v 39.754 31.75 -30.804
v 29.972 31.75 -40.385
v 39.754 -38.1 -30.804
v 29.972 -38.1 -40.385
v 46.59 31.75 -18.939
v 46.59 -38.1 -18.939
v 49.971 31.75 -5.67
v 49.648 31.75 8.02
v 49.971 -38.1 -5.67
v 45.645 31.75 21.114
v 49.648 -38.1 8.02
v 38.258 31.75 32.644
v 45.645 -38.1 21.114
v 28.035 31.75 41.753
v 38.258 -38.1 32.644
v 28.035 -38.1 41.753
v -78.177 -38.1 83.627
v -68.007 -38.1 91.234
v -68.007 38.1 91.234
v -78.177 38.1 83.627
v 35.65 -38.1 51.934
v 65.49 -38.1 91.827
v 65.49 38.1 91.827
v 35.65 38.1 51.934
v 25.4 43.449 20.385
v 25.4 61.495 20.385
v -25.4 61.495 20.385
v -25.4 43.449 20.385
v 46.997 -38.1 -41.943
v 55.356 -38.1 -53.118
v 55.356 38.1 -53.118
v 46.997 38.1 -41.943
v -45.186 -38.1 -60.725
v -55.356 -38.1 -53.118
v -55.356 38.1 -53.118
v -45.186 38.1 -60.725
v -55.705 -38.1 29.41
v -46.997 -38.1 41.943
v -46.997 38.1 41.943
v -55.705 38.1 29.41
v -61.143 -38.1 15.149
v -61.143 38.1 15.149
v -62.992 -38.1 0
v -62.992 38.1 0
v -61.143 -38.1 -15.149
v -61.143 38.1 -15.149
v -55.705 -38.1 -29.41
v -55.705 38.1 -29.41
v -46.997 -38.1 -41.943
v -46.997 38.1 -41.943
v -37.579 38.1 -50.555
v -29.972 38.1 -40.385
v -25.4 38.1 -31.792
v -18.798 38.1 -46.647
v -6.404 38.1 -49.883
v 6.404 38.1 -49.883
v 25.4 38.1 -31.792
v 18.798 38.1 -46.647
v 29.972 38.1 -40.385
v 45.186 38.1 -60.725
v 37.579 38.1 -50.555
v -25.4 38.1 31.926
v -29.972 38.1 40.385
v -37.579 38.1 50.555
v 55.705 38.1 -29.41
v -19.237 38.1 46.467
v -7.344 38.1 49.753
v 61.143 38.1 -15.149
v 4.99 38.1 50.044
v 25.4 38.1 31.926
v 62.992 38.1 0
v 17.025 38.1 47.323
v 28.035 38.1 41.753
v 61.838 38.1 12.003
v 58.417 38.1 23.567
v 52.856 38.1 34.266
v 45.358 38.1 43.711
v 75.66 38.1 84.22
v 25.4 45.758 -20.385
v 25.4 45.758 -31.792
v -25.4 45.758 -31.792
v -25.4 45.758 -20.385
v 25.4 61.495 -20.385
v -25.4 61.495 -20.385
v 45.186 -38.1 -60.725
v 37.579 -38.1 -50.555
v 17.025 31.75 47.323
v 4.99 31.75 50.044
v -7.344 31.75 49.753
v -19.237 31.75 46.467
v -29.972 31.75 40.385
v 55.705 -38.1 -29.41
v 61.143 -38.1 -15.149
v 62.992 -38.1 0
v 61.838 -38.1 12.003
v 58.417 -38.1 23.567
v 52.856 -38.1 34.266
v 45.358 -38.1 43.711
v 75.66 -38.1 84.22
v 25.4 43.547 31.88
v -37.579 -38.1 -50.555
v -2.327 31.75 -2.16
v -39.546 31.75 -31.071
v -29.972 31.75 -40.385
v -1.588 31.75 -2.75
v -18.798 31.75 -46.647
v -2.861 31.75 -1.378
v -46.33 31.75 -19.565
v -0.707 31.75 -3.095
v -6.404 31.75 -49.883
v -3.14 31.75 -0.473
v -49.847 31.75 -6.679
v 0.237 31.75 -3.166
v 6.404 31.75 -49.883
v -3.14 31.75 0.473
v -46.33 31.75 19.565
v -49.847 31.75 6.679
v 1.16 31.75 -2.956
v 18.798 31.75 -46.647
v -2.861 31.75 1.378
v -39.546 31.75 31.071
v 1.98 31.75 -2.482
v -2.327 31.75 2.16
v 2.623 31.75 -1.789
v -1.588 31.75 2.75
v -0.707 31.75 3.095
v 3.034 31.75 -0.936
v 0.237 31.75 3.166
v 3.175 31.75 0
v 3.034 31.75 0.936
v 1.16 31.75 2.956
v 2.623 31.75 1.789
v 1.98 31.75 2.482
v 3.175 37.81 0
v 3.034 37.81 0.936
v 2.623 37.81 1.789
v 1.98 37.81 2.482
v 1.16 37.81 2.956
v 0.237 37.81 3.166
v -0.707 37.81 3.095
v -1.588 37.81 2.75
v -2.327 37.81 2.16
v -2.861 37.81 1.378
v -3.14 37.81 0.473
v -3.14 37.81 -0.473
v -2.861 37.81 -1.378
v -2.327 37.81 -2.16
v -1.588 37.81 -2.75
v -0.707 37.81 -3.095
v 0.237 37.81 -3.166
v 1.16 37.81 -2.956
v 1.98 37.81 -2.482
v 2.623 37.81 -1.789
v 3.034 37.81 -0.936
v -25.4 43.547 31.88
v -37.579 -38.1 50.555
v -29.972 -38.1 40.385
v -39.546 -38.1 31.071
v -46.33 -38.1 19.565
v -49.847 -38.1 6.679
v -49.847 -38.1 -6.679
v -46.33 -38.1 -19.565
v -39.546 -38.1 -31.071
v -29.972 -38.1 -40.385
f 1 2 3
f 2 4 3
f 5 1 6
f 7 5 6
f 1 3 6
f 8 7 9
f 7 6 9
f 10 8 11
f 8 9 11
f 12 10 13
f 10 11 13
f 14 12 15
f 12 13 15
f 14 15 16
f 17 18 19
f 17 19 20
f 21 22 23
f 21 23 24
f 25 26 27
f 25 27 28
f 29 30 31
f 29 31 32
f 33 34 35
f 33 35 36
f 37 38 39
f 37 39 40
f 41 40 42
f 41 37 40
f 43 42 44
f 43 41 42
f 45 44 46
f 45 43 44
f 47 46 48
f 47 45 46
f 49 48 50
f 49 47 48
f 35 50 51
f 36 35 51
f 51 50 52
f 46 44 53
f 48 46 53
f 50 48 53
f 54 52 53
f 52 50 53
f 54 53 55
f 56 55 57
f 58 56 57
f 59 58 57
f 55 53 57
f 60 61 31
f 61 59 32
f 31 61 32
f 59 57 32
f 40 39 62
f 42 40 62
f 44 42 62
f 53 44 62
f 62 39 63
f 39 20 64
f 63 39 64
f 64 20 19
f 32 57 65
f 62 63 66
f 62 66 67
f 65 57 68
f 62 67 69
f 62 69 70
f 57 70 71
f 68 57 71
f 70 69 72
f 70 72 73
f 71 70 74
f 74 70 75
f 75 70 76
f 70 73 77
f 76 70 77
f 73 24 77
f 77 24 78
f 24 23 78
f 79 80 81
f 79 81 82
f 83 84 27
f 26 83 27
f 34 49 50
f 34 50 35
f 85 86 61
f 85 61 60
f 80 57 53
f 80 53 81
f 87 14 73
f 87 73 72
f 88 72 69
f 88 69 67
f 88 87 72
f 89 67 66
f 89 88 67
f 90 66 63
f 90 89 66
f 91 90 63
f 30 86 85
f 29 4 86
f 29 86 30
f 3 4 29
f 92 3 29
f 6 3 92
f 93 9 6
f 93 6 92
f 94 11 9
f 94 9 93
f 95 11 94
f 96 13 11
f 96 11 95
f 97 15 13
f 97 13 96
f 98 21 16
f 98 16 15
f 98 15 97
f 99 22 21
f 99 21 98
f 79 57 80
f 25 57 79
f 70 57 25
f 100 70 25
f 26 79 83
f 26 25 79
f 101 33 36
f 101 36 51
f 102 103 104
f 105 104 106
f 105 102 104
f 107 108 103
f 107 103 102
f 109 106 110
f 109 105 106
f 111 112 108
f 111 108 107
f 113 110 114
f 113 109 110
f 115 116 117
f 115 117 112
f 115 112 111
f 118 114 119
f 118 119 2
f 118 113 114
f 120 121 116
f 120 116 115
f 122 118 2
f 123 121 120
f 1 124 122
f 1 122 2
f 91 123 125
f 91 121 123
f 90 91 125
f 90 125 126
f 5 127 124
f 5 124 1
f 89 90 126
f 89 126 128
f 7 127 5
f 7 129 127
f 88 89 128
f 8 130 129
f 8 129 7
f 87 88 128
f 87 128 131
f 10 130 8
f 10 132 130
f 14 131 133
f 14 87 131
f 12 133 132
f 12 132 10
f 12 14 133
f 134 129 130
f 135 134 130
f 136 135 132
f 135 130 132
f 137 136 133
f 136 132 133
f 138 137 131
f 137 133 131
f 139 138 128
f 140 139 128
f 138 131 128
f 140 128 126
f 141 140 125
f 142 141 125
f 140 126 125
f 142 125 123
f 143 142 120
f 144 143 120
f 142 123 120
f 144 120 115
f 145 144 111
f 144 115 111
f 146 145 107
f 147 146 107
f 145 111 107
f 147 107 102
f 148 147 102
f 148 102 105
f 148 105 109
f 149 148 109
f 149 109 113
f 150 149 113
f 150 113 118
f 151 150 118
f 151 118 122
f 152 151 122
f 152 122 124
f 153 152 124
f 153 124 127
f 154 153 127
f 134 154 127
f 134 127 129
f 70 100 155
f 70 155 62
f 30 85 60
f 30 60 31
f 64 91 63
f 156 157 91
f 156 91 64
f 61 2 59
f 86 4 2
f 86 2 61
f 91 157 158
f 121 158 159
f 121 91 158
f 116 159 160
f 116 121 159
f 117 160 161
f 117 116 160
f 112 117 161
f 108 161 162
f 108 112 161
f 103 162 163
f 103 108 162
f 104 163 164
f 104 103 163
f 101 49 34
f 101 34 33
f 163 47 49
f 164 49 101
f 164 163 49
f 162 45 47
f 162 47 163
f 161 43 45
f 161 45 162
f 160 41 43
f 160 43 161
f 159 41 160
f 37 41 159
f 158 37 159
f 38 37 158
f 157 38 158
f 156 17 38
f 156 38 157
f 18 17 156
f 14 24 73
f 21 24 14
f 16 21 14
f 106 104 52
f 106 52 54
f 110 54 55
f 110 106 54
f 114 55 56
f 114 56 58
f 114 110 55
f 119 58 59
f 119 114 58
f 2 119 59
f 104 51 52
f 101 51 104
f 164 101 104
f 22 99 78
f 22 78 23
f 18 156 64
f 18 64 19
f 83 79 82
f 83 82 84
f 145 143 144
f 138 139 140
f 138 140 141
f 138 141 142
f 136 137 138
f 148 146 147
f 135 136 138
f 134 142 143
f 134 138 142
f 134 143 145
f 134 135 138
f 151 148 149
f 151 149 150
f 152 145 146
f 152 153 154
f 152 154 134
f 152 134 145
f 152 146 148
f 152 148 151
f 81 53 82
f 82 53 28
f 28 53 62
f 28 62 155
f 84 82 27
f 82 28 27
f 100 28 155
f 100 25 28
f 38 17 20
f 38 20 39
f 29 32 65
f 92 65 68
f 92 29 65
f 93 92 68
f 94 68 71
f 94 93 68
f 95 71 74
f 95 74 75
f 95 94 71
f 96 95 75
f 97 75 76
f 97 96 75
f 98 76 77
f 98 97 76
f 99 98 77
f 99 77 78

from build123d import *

# Parameters (mm, degrees)
F1_DEPTH      = 38.1
F2_R          = 50.292
F3_DEPTH      = 38.1
F3_DEPTH_BACK = 31.75
F4_R          = 3.175
F5_DEPTH      = 38.101
F6_W          = 7.948064871
F6_H          = 11.407840997
F7_DEPTH      = 25.4


with BuildPart() as f1:
    # F0 (on Front) → F1 (new body, symmetric)
    with BuildSketch(Plane.XZ):
        with BuildLine():
            ThreePointArc((-39.1949844139, 31.5125127655), (-34.8668765946, 36.2434294809), (-29.972, 40.38520125))
            Line((-29.972, 40.38520125), (-37.5791103585, 50.55494564))
            ThreePointArc((-37.5791103585, 50.55494564), (-42.506880267, 46.4882479125), (-46.9973581988, 41.9432996596))
            Line((-46.9973581988, 41.9432996596), (-39.1949844139, 31.5125127655))
        make_face()
        with BuildLine():
            ThreePointArc((-46.9973581988, 41.9432996596), (-42.506880267, 46.4882479125), (-37.5791103585, 50.55494564))
            Line((-37.5791103585, 50.55494564), (-68.0073361401, 91.2336349005))
            Line((-68.0073361401, 91.2336349005), (-78.1770228702, 83.6265676724))
            Line((-78.1770228702, 83.6265676724), (-46.9973581988, 41.9432996596))
        make_face()
        with BuildLine():
            ThreePointArc((35.649530109, 51.9336409951), (40.7121086164, 48.067829949), (45.3583906555, 43.7105074455))
            Line((45.3583906555, 43.7105074455), (75.6600814431, 84.2200354233))
            Line((75.6600814431, 84.2200354233), (65.490394713, 91.8271026513))
            Line((65.490394713, 91.8271026513), (35.649530109, 51.9336409951))
        make_face()
        with BuildLine():
            Line((46.9973581988, -41.9432996596), (39.1949844139, -31.5125127655))
            ThreePointArc((39.1949844139, -31.5125127655), (34.8668765946, -36.2434294809), (29.972, -40.38520125))
            Line((29.972, -40.38520125), (37.5791103585, -50.55494564))
            ThreePointArc((37.5791103585, -50.55494564), (42.506880267, -46.4882479125), (46.9973581988, -41.9432996596))
        make_face()
        with BuildLine():
            Line((55.3558211861, -53.1175074821), (46.9973581988, -41.9432996596))
            ThreePointArc((46.9973581988, -41.9432996596), (42.506880267, -46.4882479125), (37.5791103585, -50.55494564))
            Line((37.5791103585, -50.55494564), (45.186134456, -60.7245747102))
            Line((45.186134456, -60.7245747102), (55.3558211861, -53.1175074821))
        make_face()
        with BuildLine():
            Line((-37.5791103585, -50.55494564), (-29.972, -40.38520125))
            ThreePointArc((-29.972, -40.38520125), (-34.8668765946, -36.2434294809), (-39.1949844139, -31.5125127655))
            Line((-39.1949844139, -31.5125127655), (-46.9973581988, -41.9432996596))
            ThreePointArc((-46.9973581988, -41.9432996596), (-42.506880267, -46.4882479125), (-37.5791103585, -50.55494564))
        make_face()
        with BuildLine():
            Line((-45.186134456, -60.7245747102), (-37.5791103585, -50.55494564))
            ThreePointArc((-37.5791103585, -50.55494564), (-42.506880267, -46.4882479125), (-46.9973581988, -41.9432996596))
            Line((-46.9973581988, -41.9432996596), (-55.3558211861, -53.1175074821))
            Line((-55.3558211861, -53.1175074821), (-45.186134456, -60.7245747102))
        make_face()
        with BuildLine():
            ThreePointArc((28.0345791239, 41.7534146789), (33.0960785887, 37.867332175), (37.624745303, 33.3716017728))
            Line((37.624745303, 33.3716017728), (45.3583906555, 43.7105074455))
            ThreePointArc((45.3583906555, 43.7105074455), (40.7121086164, 48.067829949), (35.649530109, 51.9336409951))
            Line((35.649530109, 51.9336409951), (28.0345791239, 41.7534146789))
        make_face()
        with BuildLine():
            ThreePointArc((-39.1949844139, -31.5125127655), (-50.292, 0), (-39.1949844139, 31.5125127655))
            Line((-39.1949844139, 31.5125127655), (-46.9973581988, 41.9432996596))
            ThreePointArc((-46.9973581988, 41.9432996596), (-62.992, 0), (-46.9973581988, -41.9432996596))
            Line((-46.9973581988, -41.9432996596), (-39.1949844139, -31.5125127655))
        make_face()
        with BuildLine():
            ThreePointArc((37.624745303, 33.3716017728), (47.0186609485, 17.8474308126), (50.292, 0))
            ThreePointArc((50.292, 0), (47.4366916012, -16.704656654), (39.1949844139, -31.5125127655))
            Line((39.1949844139, -31.5125127655), (46.9973581988, -41.9432996596))
            ThreePointArc((46.9973581988, -41.9432996596), (58.8576658204, -22.444759704), (62.992, 0))
            ThreePointArc((62.992, 0), (58.4174965578, 23.5666747742), (45.3583906555, 43.7105074455))
            Line((45.3583906555, 43.7105074455), (37.624745303, 33.3716017728))
        make_face()
        with BuildLine():
            ThreePointArc((39.1949844139, -31.5125127655), (47.4366916012, -16.704656654), (50.292, 0))
            ThreePointArc((50.292, 0), (47.0186609485, 17.8474308126), (37.624745303, 33.3716017728))
            ThreePointArc((37.624745303, 33.3716017728), (33.0960785887, 37.867332175), (28.0345791239, 41.7534146789))
            ThreePointArc((28.0345791239, 41.7534146789), (-1.1859181715, 50.2780156936), (-29.972, 40.38520125))
            ThreePointArc((-29.972, 40.38520125), (-34.8668765946, 36.2434294809), (-39.1949844139, 31.5125127655))
            ThreePointArc((-39.1949844139, 31.5125127655), (-50.292, 0), (-39.1949844139, -31.5125127655))
            ThreePointArc((-39.1949844139, -31.5125127655), (-34.8668765946, -36.2434294809), (-29.972, -40.38520125))
            ThreePointArc((-29.972, -40.38520125), (0, -50.292), (29.972, -40.38520125))
            ThreePointArc((29.972, -40.38520125), (34.8668765946, -36.2434294809), (39.1949844139, -31.5125127655))
        make_face()
    extrude(amount=F1_DEPTH, both=True)

    # F2 (on Front) → F3 (cut, two sides)
    with BuildSketch(Plane.XZ) as f3_sk:
        Circle(F2_R)
    extrude(amount=F3_DEPTH, mode=Mode.SUBTRACT)
    extrude(f3_sk.sketch, amount=-F3_DEPTH_BACK, mode=Mode.SUBTRACT)

    # F4 (on Front) → F5 (cut, through all)
    with BuildSketch(Plane.XZ):
        Circle(F4_R)
    extrude(amount=-F5_DEPTH, mode=Mode.SUBTRACT)

    # F6 (on Right) → F7 (join, symmetric)
    with BuildSketch(Plane.YZ):
        Polygon((37.9081480205, 31.9281220436), (37.8097093926, 20.3845500946), (43.4490628541, 20.3845500946), (43.547091421, 31.8800355541), align=None)
        Polygon((43.4490628541, 20.3845500946), (37.8097093926, 20.3845500946), (37.8097093926, -20.3845500946), (45.7577742636, -20.3845500946), (61.4949830113, -20.3845500946), (61.4949830113, 20.3845500946), align=None)
        with Locations((41.7837418281, -26.0884705931)):
            Rectangle(F6_W, F6_H)
    extrude(amount=F7_DEPTH, both=True)


solid = f1.part
